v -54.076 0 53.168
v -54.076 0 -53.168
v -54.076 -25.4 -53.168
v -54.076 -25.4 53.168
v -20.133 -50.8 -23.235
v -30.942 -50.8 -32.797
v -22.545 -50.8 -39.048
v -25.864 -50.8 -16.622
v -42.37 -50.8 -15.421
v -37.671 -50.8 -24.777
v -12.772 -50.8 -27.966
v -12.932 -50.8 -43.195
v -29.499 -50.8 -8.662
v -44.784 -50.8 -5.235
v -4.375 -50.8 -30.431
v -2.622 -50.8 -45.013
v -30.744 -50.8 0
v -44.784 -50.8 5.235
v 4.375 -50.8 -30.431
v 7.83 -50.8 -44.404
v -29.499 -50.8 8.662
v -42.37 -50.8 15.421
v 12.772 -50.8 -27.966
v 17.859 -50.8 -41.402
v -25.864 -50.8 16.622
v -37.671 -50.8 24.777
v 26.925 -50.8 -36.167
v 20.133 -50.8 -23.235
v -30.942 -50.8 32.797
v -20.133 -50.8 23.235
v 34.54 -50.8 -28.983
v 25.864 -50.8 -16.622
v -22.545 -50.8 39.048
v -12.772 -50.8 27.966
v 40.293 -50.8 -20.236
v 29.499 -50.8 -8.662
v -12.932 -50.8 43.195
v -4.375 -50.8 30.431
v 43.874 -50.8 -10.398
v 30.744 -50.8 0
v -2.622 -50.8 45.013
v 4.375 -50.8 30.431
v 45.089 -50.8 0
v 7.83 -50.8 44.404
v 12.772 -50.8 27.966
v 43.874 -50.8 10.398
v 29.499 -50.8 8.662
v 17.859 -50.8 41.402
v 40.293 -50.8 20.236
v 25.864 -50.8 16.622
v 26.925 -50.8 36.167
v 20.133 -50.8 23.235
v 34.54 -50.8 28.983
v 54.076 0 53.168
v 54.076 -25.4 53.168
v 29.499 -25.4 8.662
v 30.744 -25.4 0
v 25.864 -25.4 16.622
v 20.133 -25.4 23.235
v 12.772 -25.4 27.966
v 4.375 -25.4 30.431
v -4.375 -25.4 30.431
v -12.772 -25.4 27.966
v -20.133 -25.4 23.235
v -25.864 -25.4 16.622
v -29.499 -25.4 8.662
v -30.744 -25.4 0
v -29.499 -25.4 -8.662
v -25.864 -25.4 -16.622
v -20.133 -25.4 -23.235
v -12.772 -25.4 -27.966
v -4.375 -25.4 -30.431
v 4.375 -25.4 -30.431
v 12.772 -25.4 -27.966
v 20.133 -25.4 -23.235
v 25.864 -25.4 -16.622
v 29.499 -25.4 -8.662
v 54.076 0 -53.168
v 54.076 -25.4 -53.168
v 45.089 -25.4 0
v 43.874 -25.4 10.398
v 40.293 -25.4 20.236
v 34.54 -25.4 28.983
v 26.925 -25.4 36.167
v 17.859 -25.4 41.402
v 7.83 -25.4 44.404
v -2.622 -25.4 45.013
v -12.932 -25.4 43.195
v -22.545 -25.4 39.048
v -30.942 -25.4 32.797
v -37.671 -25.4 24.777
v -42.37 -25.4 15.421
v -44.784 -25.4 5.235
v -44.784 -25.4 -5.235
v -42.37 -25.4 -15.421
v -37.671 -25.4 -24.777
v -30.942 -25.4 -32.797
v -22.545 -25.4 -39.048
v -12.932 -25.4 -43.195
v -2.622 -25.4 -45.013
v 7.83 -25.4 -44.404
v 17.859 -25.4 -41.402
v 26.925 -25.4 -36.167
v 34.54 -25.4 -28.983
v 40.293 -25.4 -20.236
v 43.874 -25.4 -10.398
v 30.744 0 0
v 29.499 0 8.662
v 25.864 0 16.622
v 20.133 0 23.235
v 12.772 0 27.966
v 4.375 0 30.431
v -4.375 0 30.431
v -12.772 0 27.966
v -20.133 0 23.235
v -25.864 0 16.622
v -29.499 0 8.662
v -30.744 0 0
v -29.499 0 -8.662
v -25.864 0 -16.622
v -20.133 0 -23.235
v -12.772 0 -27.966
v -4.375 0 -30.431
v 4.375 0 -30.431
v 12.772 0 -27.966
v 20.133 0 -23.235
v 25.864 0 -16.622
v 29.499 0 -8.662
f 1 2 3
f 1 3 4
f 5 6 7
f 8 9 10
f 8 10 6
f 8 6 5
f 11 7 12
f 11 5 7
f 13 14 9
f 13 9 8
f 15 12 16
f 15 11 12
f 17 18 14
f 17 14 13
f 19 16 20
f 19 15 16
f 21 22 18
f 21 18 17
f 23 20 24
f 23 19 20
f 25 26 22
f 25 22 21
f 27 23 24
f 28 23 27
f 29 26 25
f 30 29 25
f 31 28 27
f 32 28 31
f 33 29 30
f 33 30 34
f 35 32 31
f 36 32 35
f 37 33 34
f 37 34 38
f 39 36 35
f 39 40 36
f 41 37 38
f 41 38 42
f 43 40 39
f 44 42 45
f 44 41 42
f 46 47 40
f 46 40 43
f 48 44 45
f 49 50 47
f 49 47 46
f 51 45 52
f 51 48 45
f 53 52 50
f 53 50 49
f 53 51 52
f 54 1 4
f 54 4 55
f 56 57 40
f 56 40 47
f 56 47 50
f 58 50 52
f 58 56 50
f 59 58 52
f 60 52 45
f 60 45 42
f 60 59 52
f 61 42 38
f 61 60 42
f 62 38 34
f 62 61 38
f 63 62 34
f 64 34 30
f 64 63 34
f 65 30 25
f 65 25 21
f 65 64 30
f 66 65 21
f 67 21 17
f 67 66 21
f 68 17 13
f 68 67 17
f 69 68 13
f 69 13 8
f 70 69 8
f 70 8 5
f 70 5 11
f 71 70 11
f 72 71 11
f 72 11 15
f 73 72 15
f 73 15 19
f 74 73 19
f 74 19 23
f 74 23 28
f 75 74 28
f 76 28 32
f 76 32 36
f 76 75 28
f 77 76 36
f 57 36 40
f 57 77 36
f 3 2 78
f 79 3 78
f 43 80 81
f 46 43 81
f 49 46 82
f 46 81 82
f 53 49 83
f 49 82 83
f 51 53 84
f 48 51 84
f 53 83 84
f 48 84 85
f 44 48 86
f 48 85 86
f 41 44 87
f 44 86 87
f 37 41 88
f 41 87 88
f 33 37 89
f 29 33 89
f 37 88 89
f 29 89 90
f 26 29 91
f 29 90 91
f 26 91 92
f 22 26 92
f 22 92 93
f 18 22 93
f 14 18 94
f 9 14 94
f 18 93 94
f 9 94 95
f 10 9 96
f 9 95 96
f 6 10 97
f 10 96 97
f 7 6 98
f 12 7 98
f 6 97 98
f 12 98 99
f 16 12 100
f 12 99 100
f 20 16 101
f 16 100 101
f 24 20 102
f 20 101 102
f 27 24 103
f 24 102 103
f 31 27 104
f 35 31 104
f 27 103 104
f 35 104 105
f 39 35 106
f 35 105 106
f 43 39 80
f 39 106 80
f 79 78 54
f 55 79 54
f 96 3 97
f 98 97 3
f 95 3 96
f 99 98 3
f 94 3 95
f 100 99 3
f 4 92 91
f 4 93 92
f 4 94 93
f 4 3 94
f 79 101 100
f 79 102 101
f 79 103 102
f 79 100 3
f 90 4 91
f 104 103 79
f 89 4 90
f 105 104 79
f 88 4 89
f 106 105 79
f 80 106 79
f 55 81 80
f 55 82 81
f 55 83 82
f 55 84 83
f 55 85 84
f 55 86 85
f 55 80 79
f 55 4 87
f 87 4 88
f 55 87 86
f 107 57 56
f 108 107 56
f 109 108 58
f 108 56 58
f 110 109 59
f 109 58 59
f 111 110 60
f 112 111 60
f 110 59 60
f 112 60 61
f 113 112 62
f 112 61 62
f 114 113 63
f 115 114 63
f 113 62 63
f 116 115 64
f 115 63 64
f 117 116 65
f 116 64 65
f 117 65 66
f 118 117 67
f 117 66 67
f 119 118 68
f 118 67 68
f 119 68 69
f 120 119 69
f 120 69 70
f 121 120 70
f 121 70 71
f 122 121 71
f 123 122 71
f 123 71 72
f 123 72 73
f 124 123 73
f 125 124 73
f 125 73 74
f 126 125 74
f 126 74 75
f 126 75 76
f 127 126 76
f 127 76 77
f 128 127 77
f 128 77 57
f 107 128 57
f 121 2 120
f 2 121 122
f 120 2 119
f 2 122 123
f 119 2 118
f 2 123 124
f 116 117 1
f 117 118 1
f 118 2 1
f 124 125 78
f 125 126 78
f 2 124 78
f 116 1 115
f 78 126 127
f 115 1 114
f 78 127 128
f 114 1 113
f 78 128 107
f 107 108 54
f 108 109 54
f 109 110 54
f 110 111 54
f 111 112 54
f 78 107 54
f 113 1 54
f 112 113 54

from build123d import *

# Parameters (mm, degrees)
F0_W     = 108.1513464451
F0_H     = 106.336735189
F1_DEPTH = 25.4
F2_R     = 30.7442953742
F3_DEPTH = 25.401
F4_R     = 45.0892018552
F4_R_2   = 30.7442953742
F5_DEPTH = 25.4


with BuildPart() as f1:
    # F0 (on Front) → F1 (new body)
    with BuildSketch(Plane.XZ):
        Rectangle(F0_W, F0_H)
    extrude(amount=F1_DEPTH)

    # F2 (on face) → F3 (cut, through all)
    with BuildSketch(Plane.XZ.offset(25.4)):
        Circle(F2_R)
    extrude(amount=-F3_DEPTH, mode=Mode.SUBTRACT)

    # F4 (on face) → F5 (join)
    with BuildSketch(Plane.XZ.offset(25.4)):
        Circle(F4_R)
        Circle(F4_R_2, mode=Mode.SUBTRACT)
    extrude(amount=F5_DEPTH)


solid = f1.part
